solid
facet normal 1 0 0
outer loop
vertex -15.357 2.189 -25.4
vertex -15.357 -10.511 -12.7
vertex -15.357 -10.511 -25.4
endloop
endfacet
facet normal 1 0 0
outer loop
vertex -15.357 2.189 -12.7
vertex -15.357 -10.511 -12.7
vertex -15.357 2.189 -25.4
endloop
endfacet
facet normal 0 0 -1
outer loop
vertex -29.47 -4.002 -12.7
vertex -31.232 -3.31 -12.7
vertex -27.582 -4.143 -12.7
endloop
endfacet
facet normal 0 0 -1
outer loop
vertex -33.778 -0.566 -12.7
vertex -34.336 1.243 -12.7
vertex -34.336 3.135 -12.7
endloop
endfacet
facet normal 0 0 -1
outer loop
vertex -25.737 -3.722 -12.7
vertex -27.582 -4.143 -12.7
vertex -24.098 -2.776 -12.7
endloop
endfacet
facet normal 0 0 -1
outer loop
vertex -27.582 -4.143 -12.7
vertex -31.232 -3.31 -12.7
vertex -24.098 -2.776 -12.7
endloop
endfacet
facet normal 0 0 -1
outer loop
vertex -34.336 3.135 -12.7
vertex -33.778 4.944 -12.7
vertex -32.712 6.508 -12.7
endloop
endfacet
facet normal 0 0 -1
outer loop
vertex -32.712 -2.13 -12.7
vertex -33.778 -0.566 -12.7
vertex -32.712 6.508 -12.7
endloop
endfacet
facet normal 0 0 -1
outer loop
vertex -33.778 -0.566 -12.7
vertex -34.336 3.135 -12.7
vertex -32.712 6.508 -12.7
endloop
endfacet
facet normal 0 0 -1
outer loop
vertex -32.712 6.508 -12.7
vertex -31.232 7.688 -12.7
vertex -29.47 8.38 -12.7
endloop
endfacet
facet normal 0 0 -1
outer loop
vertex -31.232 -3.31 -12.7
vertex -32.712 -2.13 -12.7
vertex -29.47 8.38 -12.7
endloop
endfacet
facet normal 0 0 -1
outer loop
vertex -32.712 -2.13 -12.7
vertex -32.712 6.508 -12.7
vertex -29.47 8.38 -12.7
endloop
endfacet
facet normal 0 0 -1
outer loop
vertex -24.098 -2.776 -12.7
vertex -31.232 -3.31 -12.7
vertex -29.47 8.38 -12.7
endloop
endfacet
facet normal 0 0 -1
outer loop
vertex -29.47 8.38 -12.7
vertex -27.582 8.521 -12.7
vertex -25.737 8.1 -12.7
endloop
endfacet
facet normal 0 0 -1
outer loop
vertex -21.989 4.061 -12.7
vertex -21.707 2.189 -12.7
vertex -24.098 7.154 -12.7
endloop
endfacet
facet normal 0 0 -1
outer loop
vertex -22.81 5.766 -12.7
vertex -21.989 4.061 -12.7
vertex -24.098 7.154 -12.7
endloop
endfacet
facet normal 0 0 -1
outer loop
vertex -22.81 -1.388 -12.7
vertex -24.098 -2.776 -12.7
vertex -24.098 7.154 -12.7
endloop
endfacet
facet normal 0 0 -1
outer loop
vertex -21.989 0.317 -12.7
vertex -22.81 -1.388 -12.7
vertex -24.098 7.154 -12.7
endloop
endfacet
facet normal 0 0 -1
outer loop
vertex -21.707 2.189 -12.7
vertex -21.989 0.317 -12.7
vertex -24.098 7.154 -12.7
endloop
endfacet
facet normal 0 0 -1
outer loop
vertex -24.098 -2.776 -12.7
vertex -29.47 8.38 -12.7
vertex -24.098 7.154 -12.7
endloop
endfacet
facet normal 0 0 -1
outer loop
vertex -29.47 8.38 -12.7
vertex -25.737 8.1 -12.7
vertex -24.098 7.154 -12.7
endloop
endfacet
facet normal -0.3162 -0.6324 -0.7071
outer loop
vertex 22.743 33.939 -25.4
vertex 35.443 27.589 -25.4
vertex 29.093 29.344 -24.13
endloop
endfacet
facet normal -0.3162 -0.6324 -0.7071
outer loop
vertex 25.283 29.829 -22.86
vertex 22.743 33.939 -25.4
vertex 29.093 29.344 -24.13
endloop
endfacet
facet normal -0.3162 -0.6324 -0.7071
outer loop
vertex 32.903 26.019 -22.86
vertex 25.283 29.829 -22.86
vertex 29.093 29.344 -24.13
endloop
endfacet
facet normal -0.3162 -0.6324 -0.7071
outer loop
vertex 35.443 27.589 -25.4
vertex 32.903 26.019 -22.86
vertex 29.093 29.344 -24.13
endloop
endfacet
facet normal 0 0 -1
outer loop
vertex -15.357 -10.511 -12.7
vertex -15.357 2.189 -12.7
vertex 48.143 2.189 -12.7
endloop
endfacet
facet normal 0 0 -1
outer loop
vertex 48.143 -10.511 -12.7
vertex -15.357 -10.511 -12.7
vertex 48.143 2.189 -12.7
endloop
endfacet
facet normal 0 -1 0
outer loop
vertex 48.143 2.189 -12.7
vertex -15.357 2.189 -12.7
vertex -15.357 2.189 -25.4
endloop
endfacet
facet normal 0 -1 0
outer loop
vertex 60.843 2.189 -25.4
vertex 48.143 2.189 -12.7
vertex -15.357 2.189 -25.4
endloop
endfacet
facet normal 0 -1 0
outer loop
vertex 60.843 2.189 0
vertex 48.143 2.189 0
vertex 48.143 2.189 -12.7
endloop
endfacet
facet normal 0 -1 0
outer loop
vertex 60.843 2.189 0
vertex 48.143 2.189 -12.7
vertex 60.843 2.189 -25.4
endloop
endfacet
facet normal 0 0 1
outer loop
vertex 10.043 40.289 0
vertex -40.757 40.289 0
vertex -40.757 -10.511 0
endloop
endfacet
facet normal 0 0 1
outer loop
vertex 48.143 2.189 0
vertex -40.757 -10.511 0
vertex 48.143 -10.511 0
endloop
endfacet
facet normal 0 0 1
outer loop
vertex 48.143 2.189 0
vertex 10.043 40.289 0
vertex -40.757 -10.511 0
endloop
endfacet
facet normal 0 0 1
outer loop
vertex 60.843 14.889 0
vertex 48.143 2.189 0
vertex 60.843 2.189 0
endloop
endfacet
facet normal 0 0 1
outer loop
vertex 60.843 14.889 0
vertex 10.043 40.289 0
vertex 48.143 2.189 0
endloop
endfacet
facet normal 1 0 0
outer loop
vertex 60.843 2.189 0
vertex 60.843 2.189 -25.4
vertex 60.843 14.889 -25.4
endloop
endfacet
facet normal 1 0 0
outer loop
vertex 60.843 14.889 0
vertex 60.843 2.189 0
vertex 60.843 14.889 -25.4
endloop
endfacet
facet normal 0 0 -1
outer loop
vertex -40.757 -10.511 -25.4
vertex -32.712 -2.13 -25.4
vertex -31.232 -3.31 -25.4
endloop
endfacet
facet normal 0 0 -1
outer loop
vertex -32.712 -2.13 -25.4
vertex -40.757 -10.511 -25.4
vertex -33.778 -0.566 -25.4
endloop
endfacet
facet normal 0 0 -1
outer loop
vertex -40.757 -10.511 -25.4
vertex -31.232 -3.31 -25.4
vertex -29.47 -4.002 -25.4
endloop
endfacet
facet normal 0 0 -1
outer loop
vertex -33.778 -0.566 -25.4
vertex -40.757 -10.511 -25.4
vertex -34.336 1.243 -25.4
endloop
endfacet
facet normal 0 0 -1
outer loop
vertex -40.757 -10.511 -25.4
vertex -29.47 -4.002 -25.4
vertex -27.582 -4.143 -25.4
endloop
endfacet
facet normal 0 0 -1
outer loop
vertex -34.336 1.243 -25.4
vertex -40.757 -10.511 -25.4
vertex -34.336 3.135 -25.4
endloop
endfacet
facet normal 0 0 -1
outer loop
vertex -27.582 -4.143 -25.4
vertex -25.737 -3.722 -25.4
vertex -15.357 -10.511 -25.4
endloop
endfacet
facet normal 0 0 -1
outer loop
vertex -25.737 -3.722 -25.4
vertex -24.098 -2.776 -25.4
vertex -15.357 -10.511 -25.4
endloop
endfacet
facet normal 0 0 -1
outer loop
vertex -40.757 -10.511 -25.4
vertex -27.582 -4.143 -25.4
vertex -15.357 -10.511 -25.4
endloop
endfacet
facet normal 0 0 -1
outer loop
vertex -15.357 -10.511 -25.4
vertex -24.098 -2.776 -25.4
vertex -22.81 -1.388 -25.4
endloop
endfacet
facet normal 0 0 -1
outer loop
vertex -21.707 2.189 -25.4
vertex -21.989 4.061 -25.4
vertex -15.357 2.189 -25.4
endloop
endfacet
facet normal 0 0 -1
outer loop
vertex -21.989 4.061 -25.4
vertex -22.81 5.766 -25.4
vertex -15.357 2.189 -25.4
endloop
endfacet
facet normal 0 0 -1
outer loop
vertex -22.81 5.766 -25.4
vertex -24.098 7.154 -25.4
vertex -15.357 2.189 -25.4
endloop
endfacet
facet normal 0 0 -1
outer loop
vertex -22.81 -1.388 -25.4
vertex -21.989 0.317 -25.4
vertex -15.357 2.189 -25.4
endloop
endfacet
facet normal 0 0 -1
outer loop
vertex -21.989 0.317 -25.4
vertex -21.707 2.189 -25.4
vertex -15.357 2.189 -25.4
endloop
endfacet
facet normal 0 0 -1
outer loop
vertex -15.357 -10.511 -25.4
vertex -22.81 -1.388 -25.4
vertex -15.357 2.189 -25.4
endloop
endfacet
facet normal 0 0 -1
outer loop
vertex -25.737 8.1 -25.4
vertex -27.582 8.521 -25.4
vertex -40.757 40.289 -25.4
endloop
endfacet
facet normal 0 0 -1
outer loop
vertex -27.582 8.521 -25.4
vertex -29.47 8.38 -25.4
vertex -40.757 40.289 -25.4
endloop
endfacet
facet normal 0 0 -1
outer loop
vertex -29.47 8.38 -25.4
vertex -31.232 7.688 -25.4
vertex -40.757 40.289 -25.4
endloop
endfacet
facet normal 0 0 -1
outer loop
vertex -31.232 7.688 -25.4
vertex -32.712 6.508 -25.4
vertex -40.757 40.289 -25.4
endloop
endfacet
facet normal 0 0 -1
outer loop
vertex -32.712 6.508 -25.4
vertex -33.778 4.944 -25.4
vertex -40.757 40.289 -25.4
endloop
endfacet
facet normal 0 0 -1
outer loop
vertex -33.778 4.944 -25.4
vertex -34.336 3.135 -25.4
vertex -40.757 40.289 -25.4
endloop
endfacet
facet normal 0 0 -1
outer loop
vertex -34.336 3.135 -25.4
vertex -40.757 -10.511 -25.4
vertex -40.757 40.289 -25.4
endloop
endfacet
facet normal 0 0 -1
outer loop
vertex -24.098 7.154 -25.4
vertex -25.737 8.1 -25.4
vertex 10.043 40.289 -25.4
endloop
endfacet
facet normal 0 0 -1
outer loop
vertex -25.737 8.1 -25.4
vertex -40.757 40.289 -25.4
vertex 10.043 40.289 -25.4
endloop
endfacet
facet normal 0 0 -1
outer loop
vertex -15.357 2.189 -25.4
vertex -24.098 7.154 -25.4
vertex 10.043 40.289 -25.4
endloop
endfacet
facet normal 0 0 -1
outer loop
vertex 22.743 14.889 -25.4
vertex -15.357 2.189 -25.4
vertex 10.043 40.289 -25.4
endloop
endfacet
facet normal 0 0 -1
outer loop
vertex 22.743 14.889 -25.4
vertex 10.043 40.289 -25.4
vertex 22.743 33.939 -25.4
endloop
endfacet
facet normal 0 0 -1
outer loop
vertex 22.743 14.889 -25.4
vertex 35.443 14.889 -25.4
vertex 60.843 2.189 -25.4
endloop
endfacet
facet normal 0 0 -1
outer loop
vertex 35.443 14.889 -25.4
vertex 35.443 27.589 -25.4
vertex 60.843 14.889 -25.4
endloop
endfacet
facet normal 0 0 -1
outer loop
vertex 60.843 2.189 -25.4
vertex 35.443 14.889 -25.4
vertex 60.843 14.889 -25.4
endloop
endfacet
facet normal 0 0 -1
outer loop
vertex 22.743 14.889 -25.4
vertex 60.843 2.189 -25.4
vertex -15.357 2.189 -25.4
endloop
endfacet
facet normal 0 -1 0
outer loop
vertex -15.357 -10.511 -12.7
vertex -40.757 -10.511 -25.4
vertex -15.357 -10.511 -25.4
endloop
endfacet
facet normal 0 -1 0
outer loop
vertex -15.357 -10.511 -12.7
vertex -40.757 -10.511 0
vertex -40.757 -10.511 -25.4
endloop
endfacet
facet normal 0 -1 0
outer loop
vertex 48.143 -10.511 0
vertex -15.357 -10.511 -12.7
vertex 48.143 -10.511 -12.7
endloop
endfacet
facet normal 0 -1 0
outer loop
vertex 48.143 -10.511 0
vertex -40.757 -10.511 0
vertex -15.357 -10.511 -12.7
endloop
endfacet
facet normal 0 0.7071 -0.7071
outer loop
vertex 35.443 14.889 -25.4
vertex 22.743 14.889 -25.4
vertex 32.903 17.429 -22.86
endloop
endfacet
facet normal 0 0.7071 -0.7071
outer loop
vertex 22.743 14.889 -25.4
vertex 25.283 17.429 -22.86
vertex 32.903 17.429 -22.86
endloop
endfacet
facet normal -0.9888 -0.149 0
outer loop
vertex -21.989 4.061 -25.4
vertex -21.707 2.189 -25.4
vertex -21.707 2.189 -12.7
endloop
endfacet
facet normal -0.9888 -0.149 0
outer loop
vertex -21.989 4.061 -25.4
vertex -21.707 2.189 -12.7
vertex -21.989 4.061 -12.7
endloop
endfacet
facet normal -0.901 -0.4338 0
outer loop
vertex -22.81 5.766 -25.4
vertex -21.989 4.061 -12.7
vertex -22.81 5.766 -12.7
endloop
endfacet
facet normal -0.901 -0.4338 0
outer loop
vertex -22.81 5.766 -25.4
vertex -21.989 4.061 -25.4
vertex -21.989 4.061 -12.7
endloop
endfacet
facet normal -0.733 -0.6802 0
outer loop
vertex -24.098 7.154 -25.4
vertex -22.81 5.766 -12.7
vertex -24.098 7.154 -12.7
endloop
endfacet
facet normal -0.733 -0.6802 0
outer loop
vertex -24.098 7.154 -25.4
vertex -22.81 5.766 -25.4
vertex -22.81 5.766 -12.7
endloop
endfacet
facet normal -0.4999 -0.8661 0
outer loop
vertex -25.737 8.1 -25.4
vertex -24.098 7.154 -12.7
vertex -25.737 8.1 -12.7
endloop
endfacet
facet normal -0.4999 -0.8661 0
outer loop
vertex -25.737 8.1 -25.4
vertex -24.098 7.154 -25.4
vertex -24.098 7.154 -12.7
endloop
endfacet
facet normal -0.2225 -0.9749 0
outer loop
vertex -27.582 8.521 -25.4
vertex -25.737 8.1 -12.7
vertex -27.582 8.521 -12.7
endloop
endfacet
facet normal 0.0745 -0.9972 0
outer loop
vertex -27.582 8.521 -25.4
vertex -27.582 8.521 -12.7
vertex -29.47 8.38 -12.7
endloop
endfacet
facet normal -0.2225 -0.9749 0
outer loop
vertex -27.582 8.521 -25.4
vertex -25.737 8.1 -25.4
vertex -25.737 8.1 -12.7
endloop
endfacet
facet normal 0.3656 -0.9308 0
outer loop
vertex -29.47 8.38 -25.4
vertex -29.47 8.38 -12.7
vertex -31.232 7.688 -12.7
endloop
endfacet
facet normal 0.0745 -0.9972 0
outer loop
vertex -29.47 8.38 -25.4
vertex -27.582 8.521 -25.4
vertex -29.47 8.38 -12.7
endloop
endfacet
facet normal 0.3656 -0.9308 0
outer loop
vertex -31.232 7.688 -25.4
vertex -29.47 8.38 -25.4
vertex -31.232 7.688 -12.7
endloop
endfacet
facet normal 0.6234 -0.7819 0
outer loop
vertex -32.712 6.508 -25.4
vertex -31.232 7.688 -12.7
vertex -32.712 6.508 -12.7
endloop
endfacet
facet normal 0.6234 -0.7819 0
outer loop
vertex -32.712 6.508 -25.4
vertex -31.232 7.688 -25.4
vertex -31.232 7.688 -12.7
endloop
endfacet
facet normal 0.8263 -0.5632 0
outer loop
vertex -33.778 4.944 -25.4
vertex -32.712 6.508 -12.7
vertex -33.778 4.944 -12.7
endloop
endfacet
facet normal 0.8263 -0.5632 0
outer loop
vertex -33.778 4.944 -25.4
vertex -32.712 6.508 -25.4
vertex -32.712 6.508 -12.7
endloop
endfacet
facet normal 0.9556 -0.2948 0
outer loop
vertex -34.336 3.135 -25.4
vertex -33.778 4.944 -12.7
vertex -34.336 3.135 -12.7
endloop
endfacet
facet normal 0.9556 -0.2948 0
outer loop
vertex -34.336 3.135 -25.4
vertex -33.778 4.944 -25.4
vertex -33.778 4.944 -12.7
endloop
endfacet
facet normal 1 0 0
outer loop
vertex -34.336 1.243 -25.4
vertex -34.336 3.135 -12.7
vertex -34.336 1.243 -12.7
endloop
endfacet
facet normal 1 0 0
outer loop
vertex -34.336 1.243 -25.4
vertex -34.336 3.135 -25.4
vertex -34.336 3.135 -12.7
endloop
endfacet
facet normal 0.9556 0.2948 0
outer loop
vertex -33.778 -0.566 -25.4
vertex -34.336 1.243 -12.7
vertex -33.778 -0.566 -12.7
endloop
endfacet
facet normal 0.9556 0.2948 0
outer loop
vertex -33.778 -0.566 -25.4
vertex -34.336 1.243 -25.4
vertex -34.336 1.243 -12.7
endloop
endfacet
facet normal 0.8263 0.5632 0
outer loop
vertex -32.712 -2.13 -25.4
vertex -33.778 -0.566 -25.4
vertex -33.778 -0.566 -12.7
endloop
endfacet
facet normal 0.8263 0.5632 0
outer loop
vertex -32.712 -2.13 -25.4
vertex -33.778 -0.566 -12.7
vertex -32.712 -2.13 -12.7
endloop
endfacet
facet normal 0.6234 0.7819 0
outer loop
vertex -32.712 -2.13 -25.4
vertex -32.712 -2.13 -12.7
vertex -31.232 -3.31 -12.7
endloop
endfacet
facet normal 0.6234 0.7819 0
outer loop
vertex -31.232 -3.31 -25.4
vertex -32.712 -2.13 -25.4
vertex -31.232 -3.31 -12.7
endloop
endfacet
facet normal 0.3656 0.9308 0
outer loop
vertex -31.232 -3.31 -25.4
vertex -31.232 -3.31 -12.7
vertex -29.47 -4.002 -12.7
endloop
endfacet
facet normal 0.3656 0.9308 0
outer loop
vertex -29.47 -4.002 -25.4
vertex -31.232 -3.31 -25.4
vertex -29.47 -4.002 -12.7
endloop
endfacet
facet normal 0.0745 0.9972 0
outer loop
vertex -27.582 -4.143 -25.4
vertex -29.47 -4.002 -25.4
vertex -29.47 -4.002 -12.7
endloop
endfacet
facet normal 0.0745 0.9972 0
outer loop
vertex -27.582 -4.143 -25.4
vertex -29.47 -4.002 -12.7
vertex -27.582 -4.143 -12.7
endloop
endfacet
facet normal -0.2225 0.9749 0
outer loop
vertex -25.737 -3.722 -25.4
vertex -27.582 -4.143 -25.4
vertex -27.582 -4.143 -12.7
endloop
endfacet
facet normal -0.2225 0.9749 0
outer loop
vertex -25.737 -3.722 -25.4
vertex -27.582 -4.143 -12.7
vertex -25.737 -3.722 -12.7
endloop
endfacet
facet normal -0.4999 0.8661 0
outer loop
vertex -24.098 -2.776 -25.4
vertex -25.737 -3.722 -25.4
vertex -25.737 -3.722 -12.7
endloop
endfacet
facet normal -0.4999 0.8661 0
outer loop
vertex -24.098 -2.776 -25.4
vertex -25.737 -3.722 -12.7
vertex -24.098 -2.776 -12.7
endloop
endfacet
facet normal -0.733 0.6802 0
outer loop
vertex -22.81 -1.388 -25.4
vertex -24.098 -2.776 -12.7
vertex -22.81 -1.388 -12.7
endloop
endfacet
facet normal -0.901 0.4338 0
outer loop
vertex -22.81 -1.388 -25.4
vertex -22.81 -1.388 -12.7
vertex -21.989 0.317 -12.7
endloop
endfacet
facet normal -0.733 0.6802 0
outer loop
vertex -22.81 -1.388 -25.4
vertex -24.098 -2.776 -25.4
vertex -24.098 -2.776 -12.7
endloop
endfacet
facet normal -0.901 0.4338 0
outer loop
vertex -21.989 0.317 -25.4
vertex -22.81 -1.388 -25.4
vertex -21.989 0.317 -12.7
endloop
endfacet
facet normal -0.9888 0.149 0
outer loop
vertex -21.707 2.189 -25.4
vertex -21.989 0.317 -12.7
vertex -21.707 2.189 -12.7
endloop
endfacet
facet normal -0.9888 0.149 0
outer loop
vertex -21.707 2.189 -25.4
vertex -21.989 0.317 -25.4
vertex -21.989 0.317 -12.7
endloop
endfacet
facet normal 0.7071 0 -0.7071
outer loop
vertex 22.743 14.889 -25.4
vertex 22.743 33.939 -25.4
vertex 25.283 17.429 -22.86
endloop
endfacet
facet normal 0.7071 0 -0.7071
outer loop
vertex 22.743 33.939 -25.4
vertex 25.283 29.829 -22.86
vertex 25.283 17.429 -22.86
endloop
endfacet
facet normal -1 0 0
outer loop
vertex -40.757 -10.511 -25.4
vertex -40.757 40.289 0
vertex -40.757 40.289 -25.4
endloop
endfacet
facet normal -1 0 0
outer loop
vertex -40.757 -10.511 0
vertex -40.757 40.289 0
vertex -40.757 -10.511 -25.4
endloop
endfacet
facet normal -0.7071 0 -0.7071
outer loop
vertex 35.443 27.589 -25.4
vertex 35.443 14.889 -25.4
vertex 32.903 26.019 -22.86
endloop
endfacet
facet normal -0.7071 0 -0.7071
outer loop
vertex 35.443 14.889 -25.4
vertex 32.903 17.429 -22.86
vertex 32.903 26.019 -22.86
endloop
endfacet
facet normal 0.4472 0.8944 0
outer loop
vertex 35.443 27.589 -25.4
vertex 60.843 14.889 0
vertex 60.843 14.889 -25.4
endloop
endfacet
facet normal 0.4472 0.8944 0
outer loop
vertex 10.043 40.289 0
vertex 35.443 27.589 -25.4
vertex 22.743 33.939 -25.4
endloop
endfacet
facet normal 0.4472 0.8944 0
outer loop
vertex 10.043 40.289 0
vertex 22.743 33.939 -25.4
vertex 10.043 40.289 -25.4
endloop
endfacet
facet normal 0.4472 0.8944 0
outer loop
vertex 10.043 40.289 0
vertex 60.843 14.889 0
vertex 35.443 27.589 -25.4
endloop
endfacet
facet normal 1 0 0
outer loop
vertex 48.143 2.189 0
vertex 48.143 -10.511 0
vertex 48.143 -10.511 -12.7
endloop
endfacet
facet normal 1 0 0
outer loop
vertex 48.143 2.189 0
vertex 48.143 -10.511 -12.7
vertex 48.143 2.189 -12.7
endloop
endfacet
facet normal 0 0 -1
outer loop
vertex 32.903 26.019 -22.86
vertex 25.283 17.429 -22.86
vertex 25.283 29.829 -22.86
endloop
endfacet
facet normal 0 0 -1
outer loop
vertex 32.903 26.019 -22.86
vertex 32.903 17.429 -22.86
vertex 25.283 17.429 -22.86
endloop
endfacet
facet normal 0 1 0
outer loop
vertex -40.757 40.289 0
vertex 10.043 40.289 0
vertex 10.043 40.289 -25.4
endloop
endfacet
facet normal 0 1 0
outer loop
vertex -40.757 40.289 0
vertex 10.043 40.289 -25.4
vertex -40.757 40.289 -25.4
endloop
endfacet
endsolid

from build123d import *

# Parameters (mm, degrees)
F1_DEPTH = 12.7
F3_DEPTH = 12.7
F4_R     = 6.35
F5_DEPTH = 12.7
F7_DEPTH = 2.54
F7_TAPER = 45


with BuildPart() as f1:
    # F0 (on Top) → F1 (new body)
    with BuildSketch(Plane.XY):
        Polygon((-40.7569743693, 40.2890797282), (-40.7569743693, -10.5109202718), (48.1430256307, -10.5109202718), (48.1430256307, 2.1890797282), (60.8430256307, 2.1890797282), (60.8430256307, 14.8890797282), (10.0430256307, 40.2890797282), align=None)
    extrude(amount=F1_DEPTH)

    # F2 (on face) → F3 (join)
    with BuildSketch(Plane.XY.offset(12.7)):
        Polygon((-40.7569743693, 40.2890797282), (-40.7569743693, -10.5109202718), (-15.3569743693, -10.5109202718), (-15.3569743693, 2.1890797282), (48.1430256307, 2.1890797282), (60.8430256307, 2.1890797282), (60.8430256307, 14.8890797282), (10.0430256307, 40.2890797282), align=None)
    extrude(amount=F3_DEPTH)

    # F4 (on face) → F5 (cut)
    with BuildSketch(Plane.XY.offset(25.4)):
        with Locations((-28.0569743693, 2.1890797282)):
            Circle(F4_R)
    extrude(amount=-F5_DEPTH, mode=Mode.SUBTRACT)

    # F6 (on face) → F7 (cut)
    with BuildSketch(Plane.XY.offset(25.4)):
        Polygon((22.7430256307, 14.8890797282), (35.4430256307, 14.8890797282), (35.4430256307, 27.5890797282), (22.7430256307, 33.9390797282), align=None)
    extrude(amount=-F7_DEPTH, taper=F7_TAPER, mode=Mode.SUBTRACT)


with BuildPart() as f8_1:
    # F8: instance of F1
    add(f1.part.mirror(Plane(origin=(3.3794453838, 13.0859933084, 0), x_dir=(1, 0, 0), z_dir=(0, 0, -1))))


solid = f8_1.part
